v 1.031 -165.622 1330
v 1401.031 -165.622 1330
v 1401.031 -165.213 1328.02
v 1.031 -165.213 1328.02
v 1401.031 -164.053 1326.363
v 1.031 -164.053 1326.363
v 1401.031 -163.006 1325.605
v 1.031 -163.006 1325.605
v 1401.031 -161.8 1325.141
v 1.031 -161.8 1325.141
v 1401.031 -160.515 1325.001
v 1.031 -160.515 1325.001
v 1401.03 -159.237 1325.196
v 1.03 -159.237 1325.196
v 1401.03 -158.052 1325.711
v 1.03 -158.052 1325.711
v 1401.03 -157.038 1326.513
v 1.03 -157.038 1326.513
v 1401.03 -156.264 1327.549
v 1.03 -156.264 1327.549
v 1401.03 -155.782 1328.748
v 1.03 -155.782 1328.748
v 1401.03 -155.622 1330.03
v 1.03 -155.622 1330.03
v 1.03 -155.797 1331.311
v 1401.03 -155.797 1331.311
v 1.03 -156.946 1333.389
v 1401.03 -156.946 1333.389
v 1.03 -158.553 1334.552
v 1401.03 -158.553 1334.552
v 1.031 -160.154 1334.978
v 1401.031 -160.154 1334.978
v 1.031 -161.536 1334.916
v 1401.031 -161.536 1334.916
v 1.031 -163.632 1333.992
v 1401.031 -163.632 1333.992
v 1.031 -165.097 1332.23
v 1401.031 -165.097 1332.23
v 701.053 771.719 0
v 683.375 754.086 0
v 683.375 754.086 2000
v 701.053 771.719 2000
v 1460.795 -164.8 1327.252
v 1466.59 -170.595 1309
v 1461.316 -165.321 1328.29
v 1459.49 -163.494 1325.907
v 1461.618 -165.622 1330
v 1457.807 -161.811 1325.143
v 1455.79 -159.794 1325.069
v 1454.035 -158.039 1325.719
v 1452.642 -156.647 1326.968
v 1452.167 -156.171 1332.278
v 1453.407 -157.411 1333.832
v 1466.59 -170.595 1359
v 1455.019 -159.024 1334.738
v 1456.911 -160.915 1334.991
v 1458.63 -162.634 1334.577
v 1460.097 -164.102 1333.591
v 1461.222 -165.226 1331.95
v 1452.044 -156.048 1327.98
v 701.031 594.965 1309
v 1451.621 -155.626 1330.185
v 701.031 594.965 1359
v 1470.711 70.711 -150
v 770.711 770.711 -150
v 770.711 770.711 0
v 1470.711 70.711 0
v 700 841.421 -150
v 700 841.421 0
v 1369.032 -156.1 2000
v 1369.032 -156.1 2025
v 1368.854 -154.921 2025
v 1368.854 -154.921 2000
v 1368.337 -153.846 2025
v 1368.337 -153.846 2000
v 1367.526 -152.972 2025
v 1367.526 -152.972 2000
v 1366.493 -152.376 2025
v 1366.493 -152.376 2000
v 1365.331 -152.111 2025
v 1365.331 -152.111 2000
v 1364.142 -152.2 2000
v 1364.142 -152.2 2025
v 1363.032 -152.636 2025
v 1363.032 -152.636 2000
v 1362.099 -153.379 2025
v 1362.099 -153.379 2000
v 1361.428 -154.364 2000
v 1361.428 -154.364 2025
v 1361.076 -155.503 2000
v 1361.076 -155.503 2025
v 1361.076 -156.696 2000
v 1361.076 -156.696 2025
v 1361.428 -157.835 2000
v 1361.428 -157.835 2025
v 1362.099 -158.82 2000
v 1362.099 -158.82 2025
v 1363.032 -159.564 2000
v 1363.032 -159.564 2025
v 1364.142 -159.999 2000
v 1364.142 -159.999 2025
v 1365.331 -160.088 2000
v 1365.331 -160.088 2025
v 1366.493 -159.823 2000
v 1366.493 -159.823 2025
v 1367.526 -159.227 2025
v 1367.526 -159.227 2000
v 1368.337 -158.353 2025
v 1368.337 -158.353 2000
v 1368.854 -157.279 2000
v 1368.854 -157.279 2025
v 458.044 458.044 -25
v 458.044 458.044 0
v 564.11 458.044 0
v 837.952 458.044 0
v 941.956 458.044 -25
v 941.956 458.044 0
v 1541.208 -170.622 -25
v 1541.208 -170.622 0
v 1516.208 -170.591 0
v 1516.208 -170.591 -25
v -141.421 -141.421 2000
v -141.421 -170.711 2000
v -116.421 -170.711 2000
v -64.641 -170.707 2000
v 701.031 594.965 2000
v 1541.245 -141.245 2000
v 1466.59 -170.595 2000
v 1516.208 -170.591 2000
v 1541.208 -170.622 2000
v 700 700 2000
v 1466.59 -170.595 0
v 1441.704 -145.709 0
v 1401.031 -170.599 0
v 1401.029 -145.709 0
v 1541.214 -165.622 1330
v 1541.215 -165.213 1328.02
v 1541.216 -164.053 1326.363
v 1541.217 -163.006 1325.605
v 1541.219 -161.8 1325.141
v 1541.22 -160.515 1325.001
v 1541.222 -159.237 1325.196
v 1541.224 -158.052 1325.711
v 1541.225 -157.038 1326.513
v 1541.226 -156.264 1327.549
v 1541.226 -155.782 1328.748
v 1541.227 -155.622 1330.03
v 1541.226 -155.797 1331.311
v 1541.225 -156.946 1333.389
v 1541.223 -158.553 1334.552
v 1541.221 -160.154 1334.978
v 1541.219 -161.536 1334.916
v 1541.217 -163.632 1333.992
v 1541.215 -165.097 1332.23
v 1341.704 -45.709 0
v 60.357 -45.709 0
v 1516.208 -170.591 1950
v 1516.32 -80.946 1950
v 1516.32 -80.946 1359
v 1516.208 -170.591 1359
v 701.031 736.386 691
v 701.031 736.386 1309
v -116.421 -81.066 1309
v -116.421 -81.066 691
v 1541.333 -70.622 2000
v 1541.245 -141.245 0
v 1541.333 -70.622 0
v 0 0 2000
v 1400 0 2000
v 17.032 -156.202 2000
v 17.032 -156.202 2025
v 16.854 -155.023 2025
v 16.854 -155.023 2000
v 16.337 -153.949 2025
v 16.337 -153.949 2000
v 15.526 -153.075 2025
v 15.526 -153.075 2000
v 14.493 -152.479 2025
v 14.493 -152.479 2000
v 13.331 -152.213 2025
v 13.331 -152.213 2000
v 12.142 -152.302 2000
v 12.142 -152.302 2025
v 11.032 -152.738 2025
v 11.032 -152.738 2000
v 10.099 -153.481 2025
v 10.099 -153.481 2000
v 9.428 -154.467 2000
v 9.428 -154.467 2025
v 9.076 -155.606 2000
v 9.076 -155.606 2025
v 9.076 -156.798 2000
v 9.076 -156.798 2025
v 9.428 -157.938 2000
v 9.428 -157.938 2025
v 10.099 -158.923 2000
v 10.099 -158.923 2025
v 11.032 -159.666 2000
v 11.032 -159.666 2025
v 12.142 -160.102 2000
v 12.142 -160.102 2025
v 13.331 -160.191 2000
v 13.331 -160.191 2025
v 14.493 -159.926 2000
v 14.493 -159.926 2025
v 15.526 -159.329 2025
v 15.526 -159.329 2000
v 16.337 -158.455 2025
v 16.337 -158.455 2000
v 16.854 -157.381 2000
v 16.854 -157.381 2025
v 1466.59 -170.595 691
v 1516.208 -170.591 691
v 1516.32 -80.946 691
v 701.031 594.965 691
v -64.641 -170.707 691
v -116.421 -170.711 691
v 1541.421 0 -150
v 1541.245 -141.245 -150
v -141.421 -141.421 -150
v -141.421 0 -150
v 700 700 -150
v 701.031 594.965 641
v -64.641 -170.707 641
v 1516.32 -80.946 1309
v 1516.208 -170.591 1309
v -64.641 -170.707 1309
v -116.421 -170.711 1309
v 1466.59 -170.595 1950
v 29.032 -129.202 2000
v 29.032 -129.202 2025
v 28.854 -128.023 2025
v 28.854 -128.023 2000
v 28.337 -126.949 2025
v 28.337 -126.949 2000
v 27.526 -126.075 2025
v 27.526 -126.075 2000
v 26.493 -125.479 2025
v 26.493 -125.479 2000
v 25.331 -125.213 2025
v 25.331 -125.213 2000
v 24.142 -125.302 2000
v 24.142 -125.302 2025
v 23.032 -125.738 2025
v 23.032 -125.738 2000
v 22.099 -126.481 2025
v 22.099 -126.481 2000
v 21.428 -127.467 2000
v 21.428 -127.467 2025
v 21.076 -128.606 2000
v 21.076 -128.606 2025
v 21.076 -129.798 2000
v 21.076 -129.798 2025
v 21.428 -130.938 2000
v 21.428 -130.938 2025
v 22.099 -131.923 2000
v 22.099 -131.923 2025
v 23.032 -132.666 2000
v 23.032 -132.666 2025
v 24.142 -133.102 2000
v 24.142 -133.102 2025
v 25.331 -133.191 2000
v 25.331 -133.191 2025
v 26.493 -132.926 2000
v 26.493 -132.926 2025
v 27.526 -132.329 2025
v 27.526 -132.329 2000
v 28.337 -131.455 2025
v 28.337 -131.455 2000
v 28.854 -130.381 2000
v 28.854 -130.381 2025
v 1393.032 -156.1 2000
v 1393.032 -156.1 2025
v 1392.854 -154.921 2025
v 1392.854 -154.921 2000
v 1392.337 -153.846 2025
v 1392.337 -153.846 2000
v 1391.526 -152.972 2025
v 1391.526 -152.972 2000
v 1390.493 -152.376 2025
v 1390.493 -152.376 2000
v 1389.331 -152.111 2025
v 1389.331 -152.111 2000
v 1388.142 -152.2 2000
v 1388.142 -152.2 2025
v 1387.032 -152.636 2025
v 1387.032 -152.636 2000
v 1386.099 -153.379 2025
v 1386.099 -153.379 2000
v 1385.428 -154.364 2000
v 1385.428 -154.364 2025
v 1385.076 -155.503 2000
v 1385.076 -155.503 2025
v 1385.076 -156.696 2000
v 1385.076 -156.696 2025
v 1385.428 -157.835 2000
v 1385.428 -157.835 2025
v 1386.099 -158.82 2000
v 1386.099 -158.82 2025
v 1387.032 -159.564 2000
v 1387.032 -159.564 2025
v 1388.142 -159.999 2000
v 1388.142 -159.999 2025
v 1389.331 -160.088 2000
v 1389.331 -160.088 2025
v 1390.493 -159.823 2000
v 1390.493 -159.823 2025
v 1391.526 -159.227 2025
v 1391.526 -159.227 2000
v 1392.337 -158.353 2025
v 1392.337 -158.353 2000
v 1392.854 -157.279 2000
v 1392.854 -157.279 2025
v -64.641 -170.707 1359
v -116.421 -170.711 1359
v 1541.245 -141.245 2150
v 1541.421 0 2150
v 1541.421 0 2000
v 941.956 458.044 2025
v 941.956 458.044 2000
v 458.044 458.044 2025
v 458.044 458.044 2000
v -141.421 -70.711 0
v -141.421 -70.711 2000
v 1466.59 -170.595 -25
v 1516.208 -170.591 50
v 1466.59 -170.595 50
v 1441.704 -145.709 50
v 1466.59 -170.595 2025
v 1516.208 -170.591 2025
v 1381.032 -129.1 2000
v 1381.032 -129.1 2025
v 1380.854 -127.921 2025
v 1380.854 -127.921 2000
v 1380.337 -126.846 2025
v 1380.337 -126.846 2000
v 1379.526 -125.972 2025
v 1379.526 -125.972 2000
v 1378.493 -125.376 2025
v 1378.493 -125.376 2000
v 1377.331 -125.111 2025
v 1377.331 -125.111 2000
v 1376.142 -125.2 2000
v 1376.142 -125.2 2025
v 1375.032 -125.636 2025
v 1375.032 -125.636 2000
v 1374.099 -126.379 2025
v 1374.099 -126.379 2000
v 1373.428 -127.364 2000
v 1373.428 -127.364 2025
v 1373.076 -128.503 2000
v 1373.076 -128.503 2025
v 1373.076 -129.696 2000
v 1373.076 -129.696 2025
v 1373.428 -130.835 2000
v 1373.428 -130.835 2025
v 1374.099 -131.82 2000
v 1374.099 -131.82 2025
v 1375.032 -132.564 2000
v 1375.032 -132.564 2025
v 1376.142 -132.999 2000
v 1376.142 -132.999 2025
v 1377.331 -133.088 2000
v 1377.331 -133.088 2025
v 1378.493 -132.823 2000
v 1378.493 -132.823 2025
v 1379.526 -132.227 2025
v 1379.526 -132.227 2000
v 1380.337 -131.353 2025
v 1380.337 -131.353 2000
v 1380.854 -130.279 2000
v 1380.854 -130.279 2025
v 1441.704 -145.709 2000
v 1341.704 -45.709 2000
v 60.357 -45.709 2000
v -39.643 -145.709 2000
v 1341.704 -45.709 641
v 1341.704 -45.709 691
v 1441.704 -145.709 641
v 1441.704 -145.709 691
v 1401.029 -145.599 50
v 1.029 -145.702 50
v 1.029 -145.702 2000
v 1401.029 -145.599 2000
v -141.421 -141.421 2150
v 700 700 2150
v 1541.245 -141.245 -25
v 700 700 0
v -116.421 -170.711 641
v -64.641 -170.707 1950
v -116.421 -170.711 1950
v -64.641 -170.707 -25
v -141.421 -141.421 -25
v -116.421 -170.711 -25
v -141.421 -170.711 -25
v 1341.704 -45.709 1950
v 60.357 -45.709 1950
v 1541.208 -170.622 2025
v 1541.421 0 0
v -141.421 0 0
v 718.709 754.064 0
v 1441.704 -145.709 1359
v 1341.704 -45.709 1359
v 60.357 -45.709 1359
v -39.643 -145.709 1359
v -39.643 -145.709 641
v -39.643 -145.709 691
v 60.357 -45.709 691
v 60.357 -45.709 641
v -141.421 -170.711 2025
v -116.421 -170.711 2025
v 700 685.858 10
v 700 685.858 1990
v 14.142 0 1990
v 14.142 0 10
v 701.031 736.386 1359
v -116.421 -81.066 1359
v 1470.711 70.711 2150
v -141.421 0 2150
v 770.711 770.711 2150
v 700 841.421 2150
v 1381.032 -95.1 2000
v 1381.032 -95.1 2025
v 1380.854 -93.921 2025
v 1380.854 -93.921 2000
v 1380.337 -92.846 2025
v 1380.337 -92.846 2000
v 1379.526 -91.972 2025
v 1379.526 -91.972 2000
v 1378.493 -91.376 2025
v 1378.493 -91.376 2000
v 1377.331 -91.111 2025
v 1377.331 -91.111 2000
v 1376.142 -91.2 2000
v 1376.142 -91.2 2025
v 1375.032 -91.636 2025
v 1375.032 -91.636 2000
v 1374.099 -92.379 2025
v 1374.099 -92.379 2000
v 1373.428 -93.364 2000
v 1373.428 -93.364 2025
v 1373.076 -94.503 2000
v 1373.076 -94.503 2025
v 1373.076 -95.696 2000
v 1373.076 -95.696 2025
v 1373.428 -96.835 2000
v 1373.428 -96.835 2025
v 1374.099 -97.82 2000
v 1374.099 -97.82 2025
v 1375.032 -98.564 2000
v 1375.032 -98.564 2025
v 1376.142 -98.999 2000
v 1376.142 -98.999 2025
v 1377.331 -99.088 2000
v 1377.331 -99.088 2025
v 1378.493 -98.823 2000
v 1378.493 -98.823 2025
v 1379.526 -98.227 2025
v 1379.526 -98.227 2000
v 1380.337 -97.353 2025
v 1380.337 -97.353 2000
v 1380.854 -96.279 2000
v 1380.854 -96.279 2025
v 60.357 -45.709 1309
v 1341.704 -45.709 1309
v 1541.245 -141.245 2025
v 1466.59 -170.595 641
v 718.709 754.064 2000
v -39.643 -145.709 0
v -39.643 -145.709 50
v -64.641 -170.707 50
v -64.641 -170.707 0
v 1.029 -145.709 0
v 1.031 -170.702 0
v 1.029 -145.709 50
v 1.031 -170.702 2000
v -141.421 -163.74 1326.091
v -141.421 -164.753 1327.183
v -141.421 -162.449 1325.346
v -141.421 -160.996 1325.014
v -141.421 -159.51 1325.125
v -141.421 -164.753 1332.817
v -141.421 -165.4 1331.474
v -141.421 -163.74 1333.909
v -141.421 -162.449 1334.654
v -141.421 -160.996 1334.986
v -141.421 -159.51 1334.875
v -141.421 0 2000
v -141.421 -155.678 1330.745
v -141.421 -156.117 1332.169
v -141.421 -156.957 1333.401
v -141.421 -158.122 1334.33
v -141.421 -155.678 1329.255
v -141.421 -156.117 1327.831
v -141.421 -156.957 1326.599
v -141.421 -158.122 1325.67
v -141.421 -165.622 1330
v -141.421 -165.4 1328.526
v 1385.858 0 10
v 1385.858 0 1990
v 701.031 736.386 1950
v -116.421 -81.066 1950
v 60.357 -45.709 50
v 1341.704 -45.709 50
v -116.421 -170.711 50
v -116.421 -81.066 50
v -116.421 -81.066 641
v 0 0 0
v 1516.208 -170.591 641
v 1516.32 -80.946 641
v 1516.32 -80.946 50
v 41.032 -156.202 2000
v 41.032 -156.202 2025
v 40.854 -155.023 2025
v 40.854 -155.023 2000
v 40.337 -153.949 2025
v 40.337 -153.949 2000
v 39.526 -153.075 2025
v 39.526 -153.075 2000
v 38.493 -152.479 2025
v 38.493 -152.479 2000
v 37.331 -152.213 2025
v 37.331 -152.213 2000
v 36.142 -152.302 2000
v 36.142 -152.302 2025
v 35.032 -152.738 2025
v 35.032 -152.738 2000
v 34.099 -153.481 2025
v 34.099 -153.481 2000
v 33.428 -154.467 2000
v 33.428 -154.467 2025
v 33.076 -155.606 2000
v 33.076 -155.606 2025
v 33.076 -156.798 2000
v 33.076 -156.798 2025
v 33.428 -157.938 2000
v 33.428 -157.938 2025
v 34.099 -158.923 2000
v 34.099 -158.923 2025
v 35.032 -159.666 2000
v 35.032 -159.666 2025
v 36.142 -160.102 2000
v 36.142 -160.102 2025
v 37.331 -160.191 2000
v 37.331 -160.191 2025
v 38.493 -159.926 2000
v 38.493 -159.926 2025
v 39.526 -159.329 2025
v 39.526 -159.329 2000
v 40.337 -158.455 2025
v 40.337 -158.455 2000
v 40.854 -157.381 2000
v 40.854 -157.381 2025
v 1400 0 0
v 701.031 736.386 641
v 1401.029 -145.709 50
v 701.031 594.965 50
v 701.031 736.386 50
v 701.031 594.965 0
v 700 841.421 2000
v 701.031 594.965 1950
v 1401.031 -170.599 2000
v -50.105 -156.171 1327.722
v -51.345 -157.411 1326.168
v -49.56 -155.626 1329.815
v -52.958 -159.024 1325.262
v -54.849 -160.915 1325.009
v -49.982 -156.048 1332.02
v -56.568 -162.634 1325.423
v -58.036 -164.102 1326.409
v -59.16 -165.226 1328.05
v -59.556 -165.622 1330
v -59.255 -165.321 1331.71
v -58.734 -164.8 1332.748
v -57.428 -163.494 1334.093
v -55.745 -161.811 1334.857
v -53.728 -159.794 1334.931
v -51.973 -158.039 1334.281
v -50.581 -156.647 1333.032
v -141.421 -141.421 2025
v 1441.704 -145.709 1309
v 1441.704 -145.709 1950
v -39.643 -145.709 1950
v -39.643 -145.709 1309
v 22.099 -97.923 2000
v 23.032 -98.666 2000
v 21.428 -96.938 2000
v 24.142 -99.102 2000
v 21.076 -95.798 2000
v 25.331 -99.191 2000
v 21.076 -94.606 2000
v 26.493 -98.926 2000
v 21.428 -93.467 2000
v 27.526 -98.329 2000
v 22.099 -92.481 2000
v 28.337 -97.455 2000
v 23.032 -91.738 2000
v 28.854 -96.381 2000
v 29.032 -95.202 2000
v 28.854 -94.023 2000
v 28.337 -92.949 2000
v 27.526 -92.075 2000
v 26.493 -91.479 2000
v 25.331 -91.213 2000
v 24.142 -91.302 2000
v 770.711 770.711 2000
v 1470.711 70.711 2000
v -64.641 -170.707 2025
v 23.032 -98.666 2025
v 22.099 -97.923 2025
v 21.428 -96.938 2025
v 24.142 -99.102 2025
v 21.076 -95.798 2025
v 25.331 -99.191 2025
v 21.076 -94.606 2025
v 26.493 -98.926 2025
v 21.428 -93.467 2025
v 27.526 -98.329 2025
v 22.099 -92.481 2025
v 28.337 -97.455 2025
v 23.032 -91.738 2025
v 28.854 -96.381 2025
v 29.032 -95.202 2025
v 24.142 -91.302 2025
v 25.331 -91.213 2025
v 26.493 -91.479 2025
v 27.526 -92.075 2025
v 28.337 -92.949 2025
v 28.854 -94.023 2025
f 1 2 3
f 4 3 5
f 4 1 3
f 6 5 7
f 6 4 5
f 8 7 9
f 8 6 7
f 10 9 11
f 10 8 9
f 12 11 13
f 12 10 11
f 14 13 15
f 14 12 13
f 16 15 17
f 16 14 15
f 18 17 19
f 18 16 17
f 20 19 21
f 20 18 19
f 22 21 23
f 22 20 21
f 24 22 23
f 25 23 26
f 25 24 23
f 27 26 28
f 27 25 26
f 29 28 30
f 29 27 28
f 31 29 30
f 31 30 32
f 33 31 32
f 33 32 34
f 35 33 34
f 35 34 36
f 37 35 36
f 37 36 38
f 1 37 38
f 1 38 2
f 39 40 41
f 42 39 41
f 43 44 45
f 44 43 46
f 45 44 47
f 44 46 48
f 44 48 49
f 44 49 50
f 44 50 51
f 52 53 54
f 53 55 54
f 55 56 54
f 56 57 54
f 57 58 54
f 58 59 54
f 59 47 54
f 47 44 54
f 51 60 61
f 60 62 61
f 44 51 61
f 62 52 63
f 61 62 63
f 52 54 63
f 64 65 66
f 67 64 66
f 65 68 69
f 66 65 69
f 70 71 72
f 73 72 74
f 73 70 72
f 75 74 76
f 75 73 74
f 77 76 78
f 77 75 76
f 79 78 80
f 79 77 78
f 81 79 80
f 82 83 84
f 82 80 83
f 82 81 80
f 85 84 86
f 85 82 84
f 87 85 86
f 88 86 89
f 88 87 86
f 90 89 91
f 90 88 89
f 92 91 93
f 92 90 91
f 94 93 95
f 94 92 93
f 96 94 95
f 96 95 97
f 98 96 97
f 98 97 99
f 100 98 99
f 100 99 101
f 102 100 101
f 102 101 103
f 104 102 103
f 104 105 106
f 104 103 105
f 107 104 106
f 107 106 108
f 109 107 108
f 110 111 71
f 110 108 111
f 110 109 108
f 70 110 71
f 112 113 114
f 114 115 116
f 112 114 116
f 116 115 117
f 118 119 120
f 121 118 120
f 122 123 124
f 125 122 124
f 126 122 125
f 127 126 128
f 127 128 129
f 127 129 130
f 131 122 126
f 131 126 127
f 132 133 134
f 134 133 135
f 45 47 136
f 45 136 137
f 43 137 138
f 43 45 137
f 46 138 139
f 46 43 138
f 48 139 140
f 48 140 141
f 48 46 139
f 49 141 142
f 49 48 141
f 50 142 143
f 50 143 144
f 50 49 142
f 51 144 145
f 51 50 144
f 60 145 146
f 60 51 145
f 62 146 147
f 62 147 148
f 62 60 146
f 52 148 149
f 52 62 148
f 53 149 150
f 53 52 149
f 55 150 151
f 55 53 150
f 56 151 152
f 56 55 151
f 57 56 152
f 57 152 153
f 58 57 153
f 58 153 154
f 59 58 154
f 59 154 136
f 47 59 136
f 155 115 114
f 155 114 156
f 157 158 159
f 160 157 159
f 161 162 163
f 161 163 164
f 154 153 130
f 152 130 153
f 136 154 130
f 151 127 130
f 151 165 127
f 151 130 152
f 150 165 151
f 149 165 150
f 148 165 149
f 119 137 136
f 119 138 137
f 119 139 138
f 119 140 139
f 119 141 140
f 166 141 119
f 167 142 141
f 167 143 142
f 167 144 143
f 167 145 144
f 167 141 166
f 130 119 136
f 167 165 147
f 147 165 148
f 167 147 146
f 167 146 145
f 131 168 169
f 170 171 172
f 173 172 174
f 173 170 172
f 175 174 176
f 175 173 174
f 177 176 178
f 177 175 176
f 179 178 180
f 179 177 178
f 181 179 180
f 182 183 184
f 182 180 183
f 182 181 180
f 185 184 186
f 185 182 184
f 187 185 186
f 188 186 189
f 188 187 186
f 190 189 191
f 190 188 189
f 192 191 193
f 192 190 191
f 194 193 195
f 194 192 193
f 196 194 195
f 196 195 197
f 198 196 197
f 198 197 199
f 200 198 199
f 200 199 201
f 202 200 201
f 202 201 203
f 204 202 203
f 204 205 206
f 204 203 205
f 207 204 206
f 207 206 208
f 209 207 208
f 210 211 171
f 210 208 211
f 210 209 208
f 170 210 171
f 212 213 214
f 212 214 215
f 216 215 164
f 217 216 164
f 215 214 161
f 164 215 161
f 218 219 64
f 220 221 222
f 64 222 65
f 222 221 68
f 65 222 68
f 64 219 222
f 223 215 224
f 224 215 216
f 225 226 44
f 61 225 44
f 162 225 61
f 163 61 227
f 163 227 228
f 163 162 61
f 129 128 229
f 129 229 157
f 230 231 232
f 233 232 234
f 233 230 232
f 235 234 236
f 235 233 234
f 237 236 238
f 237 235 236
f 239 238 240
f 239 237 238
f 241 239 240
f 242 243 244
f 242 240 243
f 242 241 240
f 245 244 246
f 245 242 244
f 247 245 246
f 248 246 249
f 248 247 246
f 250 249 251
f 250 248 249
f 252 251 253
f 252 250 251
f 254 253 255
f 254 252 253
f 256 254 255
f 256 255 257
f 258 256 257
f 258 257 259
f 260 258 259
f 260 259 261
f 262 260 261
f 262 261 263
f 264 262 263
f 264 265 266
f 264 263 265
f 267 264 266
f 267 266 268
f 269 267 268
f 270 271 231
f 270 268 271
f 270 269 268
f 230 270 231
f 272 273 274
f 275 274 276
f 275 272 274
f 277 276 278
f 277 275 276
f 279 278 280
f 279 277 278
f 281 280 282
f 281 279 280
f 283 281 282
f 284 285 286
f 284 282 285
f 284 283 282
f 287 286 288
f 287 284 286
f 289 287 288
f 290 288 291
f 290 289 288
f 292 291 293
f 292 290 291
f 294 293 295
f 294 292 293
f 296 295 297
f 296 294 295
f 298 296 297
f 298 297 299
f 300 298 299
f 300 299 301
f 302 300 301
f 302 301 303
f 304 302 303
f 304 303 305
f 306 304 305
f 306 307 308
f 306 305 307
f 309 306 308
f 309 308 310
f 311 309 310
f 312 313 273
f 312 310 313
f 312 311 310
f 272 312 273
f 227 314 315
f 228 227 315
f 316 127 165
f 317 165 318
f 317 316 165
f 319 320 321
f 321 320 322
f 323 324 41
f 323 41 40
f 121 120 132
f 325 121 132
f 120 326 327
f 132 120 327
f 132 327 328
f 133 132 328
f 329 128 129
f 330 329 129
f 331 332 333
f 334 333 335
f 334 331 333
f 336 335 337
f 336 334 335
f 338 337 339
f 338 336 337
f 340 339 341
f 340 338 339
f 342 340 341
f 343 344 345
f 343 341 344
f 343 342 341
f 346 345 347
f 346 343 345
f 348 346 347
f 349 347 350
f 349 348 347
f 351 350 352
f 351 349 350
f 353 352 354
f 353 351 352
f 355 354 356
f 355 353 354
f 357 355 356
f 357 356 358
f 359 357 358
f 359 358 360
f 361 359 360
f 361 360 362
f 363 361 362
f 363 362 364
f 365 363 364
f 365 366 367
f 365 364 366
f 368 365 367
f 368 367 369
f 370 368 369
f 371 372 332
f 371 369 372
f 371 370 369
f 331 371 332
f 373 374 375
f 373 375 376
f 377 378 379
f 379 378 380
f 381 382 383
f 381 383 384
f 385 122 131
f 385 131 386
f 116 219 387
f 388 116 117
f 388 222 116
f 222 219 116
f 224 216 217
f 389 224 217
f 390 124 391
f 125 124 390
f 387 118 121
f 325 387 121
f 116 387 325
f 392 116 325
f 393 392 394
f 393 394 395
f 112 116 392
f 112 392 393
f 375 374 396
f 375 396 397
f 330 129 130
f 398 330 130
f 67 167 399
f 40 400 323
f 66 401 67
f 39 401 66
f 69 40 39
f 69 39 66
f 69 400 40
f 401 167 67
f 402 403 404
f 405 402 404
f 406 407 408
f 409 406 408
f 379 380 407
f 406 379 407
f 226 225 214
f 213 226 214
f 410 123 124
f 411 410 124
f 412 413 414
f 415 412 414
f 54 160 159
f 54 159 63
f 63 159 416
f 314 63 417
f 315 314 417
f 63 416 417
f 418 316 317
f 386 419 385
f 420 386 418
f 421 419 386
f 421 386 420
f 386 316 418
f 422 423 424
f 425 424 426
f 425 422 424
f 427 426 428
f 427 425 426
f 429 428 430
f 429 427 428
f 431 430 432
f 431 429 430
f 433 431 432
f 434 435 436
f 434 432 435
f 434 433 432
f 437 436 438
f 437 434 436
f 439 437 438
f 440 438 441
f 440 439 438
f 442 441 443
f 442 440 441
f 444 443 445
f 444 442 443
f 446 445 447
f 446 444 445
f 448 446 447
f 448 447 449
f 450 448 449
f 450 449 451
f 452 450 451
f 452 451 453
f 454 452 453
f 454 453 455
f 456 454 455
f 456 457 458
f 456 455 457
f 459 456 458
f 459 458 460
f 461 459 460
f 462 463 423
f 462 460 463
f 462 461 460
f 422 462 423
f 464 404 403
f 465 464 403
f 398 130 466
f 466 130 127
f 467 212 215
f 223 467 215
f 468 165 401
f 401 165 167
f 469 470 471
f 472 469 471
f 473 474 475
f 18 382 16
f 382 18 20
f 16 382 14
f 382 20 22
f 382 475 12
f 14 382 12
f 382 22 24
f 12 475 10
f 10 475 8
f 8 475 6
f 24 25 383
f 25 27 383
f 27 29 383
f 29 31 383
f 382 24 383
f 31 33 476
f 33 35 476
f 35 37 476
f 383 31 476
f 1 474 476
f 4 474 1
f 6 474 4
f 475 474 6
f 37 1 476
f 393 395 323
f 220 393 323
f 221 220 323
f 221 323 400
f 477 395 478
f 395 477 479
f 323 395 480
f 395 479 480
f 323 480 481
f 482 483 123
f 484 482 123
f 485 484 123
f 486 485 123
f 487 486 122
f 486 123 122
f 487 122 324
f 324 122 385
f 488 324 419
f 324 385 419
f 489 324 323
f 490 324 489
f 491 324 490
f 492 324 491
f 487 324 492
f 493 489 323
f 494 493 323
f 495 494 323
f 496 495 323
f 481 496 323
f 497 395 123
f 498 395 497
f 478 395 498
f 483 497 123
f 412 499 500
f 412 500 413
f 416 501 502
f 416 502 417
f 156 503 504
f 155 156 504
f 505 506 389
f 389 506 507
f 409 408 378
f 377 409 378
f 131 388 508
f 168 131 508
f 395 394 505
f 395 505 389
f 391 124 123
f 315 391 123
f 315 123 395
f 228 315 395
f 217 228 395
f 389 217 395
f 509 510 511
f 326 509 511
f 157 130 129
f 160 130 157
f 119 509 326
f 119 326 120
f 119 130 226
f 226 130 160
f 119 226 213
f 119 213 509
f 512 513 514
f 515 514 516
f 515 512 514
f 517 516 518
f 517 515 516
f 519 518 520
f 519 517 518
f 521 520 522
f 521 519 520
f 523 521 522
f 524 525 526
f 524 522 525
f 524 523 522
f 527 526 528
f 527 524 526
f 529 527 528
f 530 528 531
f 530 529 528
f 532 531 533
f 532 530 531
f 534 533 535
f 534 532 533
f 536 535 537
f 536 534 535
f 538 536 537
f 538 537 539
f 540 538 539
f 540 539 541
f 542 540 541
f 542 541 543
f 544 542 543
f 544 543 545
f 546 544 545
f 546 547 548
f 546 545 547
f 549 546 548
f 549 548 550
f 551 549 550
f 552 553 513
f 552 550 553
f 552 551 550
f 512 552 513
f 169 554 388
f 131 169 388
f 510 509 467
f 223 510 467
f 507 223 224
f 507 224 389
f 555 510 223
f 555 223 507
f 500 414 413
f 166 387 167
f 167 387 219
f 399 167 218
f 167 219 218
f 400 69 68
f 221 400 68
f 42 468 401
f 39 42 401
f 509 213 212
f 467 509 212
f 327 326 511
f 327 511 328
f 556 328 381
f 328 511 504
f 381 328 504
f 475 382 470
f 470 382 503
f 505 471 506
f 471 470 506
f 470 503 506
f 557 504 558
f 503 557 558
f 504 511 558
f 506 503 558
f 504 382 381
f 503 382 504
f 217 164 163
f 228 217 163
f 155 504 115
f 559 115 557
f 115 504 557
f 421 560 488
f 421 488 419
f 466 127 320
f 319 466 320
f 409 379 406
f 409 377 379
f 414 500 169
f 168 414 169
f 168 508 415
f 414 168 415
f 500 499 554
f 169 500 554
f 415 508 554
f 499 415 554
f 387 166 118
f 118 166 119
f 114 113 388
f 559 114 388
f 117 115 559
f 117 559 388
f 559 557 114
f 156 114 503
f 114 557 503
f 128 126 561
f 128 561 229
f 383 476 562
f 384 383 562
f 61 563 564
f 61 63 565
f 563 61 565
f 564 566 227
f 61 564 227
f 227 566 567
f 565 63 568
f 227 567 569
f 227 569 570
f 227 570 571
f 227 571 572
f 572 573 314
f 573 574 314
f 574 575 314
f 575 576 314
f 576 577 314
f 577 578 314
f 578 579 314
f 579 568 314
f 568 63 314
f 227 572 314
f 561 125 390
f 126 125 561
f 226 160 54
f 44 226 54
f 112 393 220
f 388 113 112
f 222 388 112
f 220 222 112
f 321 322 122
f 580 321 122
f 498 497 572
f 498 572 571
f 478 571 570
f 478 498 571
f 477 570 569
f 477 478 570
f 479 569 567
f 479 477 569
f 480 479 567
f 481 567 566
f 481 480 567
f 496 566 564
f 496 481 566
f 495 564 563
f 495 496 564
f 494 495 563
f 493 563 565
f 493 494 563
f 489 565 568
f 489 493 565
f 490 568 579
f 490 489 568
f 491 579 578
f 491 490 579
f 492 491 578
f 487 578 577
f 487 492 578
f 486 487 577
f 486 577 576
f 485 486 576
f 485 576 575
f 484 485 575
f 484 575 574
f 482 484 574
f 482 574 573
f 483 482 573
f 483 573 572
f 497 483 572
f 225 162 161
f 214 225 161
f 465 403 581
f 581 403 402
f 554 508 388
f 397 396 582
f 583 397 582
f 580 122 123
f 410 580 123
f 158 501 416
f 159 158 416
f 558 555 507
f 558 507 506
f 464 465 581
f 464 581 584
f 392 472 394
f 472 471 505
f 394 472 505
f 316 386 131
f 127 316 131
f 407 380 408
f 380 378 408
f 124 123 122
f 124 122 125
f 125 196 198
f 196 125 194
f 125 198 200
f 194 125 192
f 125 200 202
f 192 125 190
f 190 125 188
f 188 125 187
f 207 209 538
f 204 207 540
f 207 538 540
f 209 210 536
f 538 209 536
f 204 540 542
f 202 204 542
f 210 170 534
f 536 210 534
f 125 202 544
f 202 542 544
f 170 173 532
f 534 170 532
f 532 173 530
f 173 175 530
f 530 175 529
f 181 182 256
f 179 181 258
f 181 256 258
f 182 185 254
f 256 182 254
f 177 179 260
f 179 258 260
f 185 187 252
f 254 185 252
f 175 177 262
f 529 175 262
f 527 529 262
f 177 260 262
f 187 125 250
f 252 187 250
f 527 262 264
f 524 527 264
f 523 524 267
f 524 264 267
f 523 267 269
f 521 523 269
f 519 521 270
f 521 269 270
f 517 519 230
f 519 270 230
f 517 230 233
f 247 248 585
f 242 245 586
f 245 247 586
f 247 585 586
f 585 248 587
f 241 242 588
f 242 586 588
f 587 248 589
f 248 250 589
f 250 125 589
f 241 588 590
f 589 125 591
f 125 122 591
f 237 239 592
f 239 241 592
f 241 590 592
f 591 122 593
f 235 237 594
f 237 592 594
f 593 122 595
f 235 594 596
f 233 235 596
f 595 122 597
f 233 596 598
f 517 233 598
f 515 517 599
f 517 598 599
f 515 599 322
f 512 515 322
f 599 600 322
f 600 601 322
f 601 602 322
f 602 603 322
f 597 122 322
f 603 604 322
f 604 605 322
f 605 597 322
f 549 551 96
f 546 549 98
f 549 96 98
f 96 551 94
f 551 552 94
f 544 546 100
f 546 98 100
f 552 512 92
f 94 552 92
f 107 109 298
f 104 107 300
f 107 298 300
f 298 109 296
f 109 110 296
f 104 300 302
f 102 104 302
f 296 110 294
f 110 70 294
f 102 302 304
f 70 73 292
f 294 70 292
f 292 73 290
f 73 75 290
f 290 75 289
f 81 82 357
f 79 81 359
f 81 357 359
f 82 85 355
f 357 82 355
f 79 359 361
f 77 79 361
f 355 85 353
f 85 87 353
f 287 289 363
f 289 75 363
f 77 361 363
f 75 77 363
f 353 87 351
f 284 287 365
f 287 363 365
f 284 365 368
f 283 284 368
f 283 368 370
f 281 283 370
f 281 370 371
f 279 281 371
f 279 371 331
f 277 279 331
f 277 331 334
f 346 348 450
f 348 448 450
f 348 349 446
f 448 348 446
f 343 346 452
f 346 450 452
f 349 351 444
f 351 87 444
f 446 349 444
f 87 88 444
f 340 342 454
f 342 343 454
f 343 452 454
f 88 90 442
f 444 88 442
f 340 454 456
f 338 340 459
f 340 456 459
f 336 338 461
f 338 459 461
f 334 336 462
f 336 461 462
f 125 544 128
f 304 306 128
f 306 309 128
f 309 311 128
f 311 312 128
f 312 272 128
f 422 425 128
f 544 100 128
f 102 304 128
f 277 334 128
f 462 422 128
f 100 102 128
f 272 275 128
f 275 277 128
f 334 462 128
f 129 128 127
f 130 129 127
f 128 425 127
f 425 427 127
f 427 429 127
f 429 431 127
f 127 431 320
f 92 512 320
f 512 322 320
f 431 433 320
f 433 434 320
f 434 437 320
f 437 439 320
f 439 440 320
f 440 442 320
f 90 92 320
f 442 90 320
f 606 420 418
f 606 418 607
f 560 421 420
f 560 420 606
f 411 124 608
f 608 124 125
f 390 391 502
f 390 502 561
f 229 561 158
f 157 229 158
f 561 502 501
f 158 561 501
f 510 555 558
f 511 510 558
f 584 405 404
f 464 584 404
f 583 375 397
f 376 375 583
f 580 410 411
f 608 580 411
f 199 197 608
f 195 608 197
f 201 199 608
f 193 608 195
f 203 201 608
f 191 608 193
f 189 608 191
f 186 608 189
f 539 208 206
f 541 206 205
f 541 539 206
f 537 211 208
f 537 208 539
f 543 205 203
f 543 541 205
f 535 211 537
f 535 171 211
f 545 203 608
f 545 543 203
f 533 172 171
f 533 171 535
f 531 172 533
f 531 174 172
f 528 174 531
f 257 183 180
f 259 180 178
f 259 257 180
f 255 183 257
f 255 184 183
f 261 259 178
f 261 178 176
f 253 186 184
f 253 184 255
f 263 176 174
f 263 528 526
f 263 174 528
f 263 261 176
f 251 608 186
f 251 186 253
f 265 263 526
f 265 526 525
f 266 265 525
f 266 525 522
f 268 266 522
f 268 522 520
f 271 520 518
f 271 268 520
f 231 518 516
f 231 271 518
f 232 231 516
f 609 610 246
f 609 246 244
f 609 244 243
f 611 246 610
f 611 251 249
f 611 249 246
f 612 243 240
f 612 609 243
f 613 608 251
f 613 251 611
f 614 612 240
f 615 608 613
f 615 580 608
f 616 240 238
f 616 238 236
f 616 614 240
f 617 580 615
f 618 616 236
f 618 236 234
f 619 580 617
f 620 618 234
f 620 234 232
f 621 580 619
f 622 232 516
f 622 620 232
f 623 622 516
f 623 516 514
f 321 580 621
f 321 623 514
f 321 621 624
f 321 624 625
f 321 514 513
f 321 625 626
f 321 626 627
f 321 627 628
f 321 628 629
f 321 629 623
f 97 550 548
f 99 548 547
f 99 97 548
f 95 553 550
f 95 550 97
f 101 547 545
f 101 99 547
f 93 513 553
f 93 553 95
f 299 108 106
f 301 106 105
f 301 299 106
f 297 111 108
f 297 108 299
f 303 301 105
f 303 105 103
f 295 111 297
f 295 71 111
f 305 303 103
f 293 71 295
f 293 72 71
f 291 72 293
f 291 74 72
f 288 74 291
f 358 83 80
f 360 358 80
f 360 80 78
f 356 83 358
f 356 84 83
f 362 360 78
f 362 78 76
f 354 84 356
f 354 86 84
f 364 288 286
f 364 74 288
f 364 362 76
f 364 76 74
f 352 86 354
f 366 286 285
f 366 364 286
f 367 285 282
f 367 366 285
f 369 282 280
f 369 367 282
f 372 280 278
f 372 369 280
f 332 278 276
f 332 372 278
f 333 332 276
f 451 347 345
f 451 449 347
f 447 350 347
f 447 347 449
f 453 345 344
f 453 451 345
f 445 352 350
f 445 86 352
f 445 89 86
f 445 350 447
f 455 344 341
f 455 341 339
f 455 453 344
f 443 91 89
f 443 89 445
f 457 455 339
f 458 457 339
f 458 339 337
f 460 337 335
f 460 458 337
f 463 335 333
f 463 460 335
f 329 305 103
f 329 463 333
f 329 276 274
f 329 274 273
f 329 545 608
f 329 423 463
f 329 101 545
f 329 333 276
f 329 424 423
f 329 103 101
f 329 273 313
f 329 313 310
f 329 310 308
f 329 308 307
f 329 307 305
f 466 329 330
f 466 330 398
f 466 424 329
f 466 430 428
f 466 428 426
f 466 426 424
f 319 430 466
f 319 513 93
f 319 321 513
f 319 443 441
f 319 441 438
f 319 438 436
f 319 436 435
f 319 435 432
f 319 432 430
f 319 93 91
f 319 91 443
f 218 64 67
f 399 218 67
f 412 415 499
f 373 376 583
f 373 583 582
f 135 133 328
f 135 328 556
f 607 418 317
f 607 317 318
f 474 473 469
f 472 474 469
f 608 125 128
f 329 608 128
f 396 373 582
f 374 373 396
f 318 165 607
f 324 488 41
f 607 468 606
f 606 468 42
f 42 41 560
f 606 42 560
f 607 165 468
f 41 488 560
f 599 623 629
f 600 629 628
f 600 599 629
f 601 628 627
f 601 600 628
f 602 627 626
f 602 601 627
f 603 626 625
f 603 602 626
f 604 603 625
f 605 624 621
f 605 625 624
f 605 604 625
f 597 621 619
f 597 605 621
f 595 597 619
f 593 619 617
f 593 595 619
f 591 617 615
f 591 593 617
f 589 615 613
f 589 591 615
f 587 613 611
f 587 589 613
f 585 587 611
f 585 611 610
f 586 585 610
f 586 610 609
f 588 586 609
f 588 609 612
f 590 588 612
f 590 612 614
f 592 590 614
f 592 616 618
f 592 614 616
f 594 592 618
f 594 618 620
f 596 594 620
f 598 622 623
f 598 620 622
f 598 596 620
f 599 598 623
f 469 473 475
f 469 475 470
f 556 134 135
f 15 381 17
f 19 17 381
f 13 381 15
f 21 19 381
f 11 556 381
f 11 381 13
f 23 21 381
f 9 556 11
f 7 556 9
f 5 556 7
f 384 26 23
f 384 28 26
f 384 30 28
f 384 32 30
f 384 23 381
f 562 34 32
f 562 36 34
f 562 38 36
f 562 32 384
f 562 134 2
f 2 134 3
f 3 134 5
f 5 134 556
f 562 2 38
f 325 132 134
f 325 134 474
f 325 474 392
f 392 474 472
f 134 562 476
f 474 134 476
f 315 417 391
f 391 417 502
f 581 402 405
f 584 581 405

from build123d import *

# Parameters (mm, degrees)
BOSS_EXTRUDE1_DEPTH      = 2000
SHELL1_T                 = -10
SKETCH3_W                = 150
SKETCH3_H                = 1096.015510839
BOSS_EXTRUDE2_DEPTH      = 100
SKETCH7_W                = 150
SKETCH7_H                = 1089.949493661
BOSS_EXTRUDE4_DEPTH      = 100
CUT_EXTRUDE1_DEPTH       = 6
CUT_EXTRUDE1_DEPTH_BACK  = 6.066017
SKETCH8_W                = 150
SKETCH8_H                = 100
SKETCH9_W                = 150
SKETCH9_H                = 100
BOSS_EXTRUDE5_DEPTH      = 239.05
SKETCH10_W               = 150
SKETCH10_H               = 100
BOSS_EXTRUDE6_DEPTH      = 399.5
CUT_EXTRUDE4_DEPTH       = 1197.5
SKETCH14_W               = 2000
SKETCH14_H               = 100
BOSS_EXTRUDE7_DEPTH      = 25
SKETCH15_W               = 2000
SKETCH15_H               = 100
BOSS_EXTRUDE8_DEPTH      = 25
SKETCH16_W               = 2000
SKETCH16_H               = 25
BOSS_EXTRUDE9_DEPTH      = 1436
SKETCH17_W               = 25
SKETCH17_H               = 2000
BOSS_EXTRUDE10_DEPTH     = 1436
CUT_EXTRUDE11_DEPTH      = 1286
CUT_EXTRUDE12_DEPTH      = 1286
BOSS_EXTRUDE13_DEPTH     = 50
BOSS_EXTRUDE14_DEPTH     = 50
BOSS_EXTRUDE15_DEPTH     = 50
BOSS_EXTRUDE16_DEPTH     = 50
BOSS_EXTRUDE17_DEPTH     = 50
BOSS_EXTRUDE18_DEPTH     = 50
BOSS_EXTRUDE19_DEPTH     = 50
BOSS_EXTRUDE20_DEPTH     = 50
SKETCH34_W               = 1400
SKETCH34_H               = 2000
BOSS_EXTRUDE21_DEPTH     = 25
BOSS_EXTRUDE22_DEPTH     = 25
BOSS_EXTRUDE23_DEPTH     = 25
CUT_EXTRUDE16_DEPTH      = 2777.052898712
CUT_EXTRUDE16_DEPTH_BACK = 2777.052898712
SKETCH43_R               = 5
SKETCH45_R               = 4
CUT_EXTRUDE17_DEPTH      = 30


with BuildPart() as part:
    # Sketch1 → Boss-Extrude1 (new body)
    with BuildSketch(Plane.XY):
        Polygon((0, 0), (1400, 0), (700, 700), align=None)
    extrude(amount=BOSS_EXTRUDE1_DEPTH)

    # Shell1
    shell1_openings = [part.faces().sort_by_distance(p)[0] for p in [
        (700, 0, 1000),
    ]]
    offset(amount=SHELL1_T, openings=shell1_openings, kind=Kind.INTERSECTION)


with BuildPart() as body_2:
    # Sketch3 → Boss-Extrude2 (new body)
    with BuildSketch(Plane(origin=(0, 0, 0), x_dir=(0, 0, 1), z_dir=(-0.7071067811865477, 0.7071067811865475, 0))):
        with Locations((2075, 548.00775542)):
            Rectangle(SKETCH3_W, SKETCH3_H)
    extrude(amount=BOSS_EXTRUDE2_DEPTH)

    # Sketch7 → Boss-Extrude4 (add)
    with BuildSketch(Plane(origin=(700, 700, 0), x_dir=(0, 0, -1), z_dir=(0.7071067811865477, 0.7071067811865475, 0))):
        with Locations((-2075, -444.974746831)):
            Rectangle(SKETCH7_W, SKETCH7_H)
    extrude(amount=BOSS_EXTRUDE4_DEPTH)

    # Sketch8 → Cut-Extrude1 (cut, two sides: drawn at the far end of the back side and taken through both)
    with BuildSketch(Plane(origin=(775, 775, 0), x_dir=(0, 0, -1), z_dir=(0.7071067811865476, 0.7071067811865476, 0)).offset(-CUT_EXTRUDE1_DEPTH_BACK)):
        with Locations((-2075, 50)):
            Rectangle(SKETCH8_W, SKETCH8_H)
    extrude(amount=CUT_EXTRUDE1_DEPTH + CUT_EXTRUDE1_DEPTH_BACK, mode=Mode.SUBTRACT)

    # Sketch9 → Boss-Extrude5 (add)
    with BuildSketch(Plane(origin=(0, 0, 0), x_dir=(0, 0, 1), z_dir=(-0.7071067811865476, -0.7071067811865476, 0))):
        with Locations((2075, 50)):
            Rectangle(SKETCH9_W, SKETCH9_H)
    extrude(amount=BOSS_EXTRUDE5_DEPTH)

    # Sketch10 → Boss-Extrude6 (add)
    with BuildSketch(Plane(origin=(700, -700, 0), x_dir=(0, 0, -1), z_dir=(0.7071067811865476, -0.7071067811865476, 0))):
        with Locations((-2075, 1039.949493661)):
            Rectangle(SKETCH10_W, SKETCH10_H)
    extrude(amount=BOSS_EXTRUDE6_DEPTH)

    # Sketch13 → Cut-Extrude4 (cut)
    with BuildSketch(Plane.XY.offset(2150)):
        Polygon((-141.421356237, 0), (-141.421356237, -141.421356237), (-169.033876043, -169.033876043), (-239.744554161, -98.323197924), align=None)
        Polygon((1541.421356237, 0), (1753.199837203, -211.778480965), (1682.489159084, -282.489159084), (1541.244579542, -141.244579542), align=None)
    extrude(amount=-CUT_EXTRUDE4_DEPTH, mode=Mode.SUBTRACT)


with BuildPart() as body_3:
    # Mirror4: mirrored copy
    add(body_2.part.mirror(Plane.XY.offset(1000)))


with BuildPart() as body_2_1:
    add(body_2.part)

    add(body_3.part)  # Boss-Extrude7 merges body 3
    # Sketch14 → Boss-Extrude7 (add)
    with BuildSketch(Plane.ZY.offset(141.421356237)):
        with Locations((1000, -120.710678119)):
            Rectangle(SKETCH14_W, SKETCH14_H)
    extrude(amount=-BOSS_EXTRUDE7_DEPTH)

    # Sketch15 → Boss-Extrude8 (add)
    with BuildSketch(Plane(origin=(1541.418941738, -1.929185159, 0), x_dir=(0, 0, -1), z_dir=(0.999999216794127, -0.001251563475337267, 0))):
        with Locations((-1000, -118.693158413)):
            Rectangle(SKETCH15_W, SKETCH15_H)
    extrude(amount=-BOSS_EXTRUDE8_DEPTH)

    # Sketch16 → Boss-Extrude9 (add)
    with BuildSketch(Plane(origin=(-106.066017178, -106.066017178, 0), x_dir=(0, 0, -1), z_dir=(0.7071067811865483, 0.7071067811865468, 0))):
        with Locations((-1000, 37.5)):
            Rectangle(SKETCH16_W, SKETCH16_H)
    extrude(amount=BOSS_EXTRUDE9_DEPTH)

    # Sketch17 → Boss-Extrude10 (add)
    with BuildSketch(Plane(origin=(804.048443672, -806.063602678, 0), x_dir=(0.7079912163968599, 0.7062212383558673, 0), z_dir=(-0.7062212383558673, 0.7079912163968599, 0))):
        with Locations((1028.875241871, -1000)):
            Rectangle(SKETCH17_W, SKETCH17_H)
    extrude(amount=BOSS_EXTRUDE10_DEPTH)

    # Sketch27 → Cut-Extrude11 (cut)
    with BuildSketch(Plane(origin=(719.584743808, 717.785781949, 0), x_dir=(0, 0, 1), z_dir=(-0.7079912163968599, -0.7062212383558673, 0))):
        Polygon((0, 101.272137447), (0, 51.272098287), (2000, 51.272098287), (2000, 101.272137447), (2000, 297.477961859), (0, 297.477961859), align=None)
    extrude(amount=-CUT_EXTRUDE11_DEPTH, mode=Mode.SUBTRACT)

    # Sketch28 → Cut-Extrude12 (cut)
    with BuildSketch(Plane(origin=(-17.67766953, 17.67766953, 0), x_dir=(0, 0, -1), z_dir=(0.7071067811865468, -0.7071067811865483, 0))):
        Polygon((-2000, 1041.407346594), (0, 1041.407346594), (0, 1089.949493661), (0, 1286), (-2000, 1286), (-2000, 1089.949493661), align=None)
    extrude(amount=-CUT_EXTRUDE12_DEPTH, mode=Mode.SUBTRACT)

    # Sketch29 → Boss-Extrude13 (add)
    with BuildSketch(Plane(origin=(0, 0, 2000), x_dir=(-1, 0, 0), z_dir=(0, 0, -1))):
        Polygon((-701.03084385, 594.964826672), (-1466.590232409, -170.594561887), (-1516.207831122, -170.590922364), (-1516.320027106, -80.946331633), (-701.03084385, 736.386182909), (-630.320165731, 665.67550479), (116.421356237, -81.066017178), (116.421356237, -170.710678119), (64.640862765, -170.706879943), align=None)
    extrude(amount=BOSS_EXTRUDE13_DEPTH)

    # Sketch30 → Boss-Extrude14 (add)
    with BuildSketch(Plane(origin=(0, 0, 1359), x_dir=(-1, 0, 0), z_dir=(0, 0, -1))):
        Polygon((-701.03084385, 736.386182909), (-1516.320027106, -80.946331633), (-1516.207831122, -170.590922364), (-1466.590232409, -170.594561887), (-701.03084385, 594.964826672), (64.640862765, -170.706879943), (116.421356237, -170.710678119), (116.421356237, -81.066017178), align=None)
    extrude(amount=BOSS_EXTRUDE14_DEPTH)

    # Sketch31 → Boss-Extrude15 (add)
    with BuildSketch(Plane(origin=(0, 0, 691), x_dir=(-1, 0, 0), z_dir=(0, 0, -1))):
        Polygon((116.421356237, -81.066017178), (-701.03084385, 736.386182909), (-1516.320027106, -80.946331633), (-1516.207831122, -170.590922364), (-1466.590232409, -170.594561887), (-701.03084385, 594.964826672), (64.640862765, -170.706879943), (116.421356237, -170.710678119), align=None)
    extrude(amount=BOSS_EXTRUDE15_DEPTH)

    # Sketch33 → Boss-Extrude16 (add)
    with BuildSketch(Plane(origin=(0, 0, 50), x_dir=(-1, 0, 0), z_dir=(0, 0, -1))):
        Polygon((116.421356237, -170.710678119), (116.421356237, -81.066017178), (-701.03084385, 736.386182909), (-1516.320027106, -80.946331633), (-1516.207831122, -170.590922364), (-1466.590232409, -170.594561887), (-701.03084385, 594.964826672), (64.640862765, -170.706879943), align=None)
    extrude(amount=BOSS_EXTRUDE16_DEPTH)



with BuildPart() as body_3_2:
    # Sketch35 → Boss-Extrude17 (new body)
    with BuildSketch(Plane.XY.offset(2000)):
        Polygon((1341.704449553, -45.708779031), (60.357238147, -45.708779031), (-39.642761853, -145.708779031), (1441.704449553, -145.708779031), align=None)
    extrude(amount=-BOSS_EXTRUDE17_DEPTH)


with BuildPart() as body_4:
    # Sketch36 → Boss-Extrude18 (new body)
    with BuildSketch(Plane(origin=(0, 0, 1359), x_dir=(-1, 0, 0), z_dir=(0, 0, -1))):
        Polygon((39.642761853, -145.708779031), (-60.357238147, -45.708779031), (-1341.704449553, -45.708779031), (-1441.704449553, -145.708779031), align=None)
    extrude(amount=BOSS_EXTRUDE18_DEPTH)


with BuildPart() as body_5:
    # Sketch37 → Boss-Extrude19 (new body)
    with BuildSketch(Plane(origin=(0, 0, 691), x_dir=(-1, 0, 0), z_dir=(0, 0, -1))):
        Polygon((-1441.704449553, -145.708779031), (39.642761853, -145.708779031), (-60.357238147, -45.708779031), (-1341.704449553, -45.708779031), align=None)
    extrude(amount=BOSS_EXTRUDE19_DEPTH)


with BuildPart() as body_6:
    # Sketch38 → Boss-Extrude20 (new body)
    with BuildSketch(Plane(origin=(0, 0, 50), x_dir=(-1, 0, 0), z_dir=(0, 0, -1))):
        Polygon((-1341.704449553, -45.708779031), (-1441.704449553, -145.708779031), (39.642761853, -145.708779031), (-60.357238147, -45.708779031), align=None)
    extrude(amount=BOSS_EXTRUDE20_DEPTH)


with BuildPart() as body_7:
    # Sketch34 → Boss-Extrude21 (new body)
    with BuildSketch(Plane(origin=(0.012521253, -170.702137522, 0), x_dir=(0.9999999973097808, 7.335147241276342e-05, 0), z_dir=(7.335147241276342e-05, -0.9999999973097808, 0))):
        with Locations((701.018757721, 1000)):
            Rectangle(SKETCH34_W, SKETCH34_H)
    extrude(amount=-BOSS_EXTRUDE21_DEPTH)


with BuildPart() as body_8:
    # Sketch39 → Boss-Extrude22 (new body)
    with BuildSketch(Plane.XY.offset(2000)):
        Polygon((-64.640862765, -170.706879943), (1466.590232409, -170.594561887), (1516.207831122, -170.590922364), (1541.207811542, -170.62221145), (1541.244579542, -141.244579542), (941.956165613, 458.043834387), (458.043834387, 458.043834387), (-141.421356237, -141.421356237), (-141.421356237, -170.710678119), (-116.421356237, -170.710678119), align=None)
    extrude(amount=BOSS_EXTRUDE22_DEPTH)

    # Sketch45 → Cut-Extrude17 (cut)
    with BuildSketch(Plane.XY.offset(2000)):
        with Locations((13.031645739, -156.202062795)):
            Circle(SKETCH45_R)
        with Locations((37.031645739, -156.202062795)):
            Circle(SKETCH45_R)
        with Locations((25.031645739, -129.202062795)):
            Circle(SKETCH45_R)
        with Locations((25.031645739, -95.202062795)):
            Circle(SKETCH45_R)
        with Locations((1365.031641973, -156.099664126)):
            Circle(SKETCH45_R)
        with Locations((1389.031641973, -156.099664126)):
            Circle(SKETCH45_R)
        with Locations((1377.031641973, -129.099664126)):
            Circle(SKETCH45_R)
        with Locations((1377.031641973, -95.099664126)):
            Circle(SKETCH45_R)
    extrude(amount=CUT_EXTRUDE17_DEPTH, mode=Mode.SUBTRACT)


with BuildPart() as body_2_2:
    add(body_2_1.part)

    add(body_6.part)  # Boss-Extrude23 merges body 6

    add(body_7.part)  # Boss-Extrude23 merges body 7
    # Sketch40 → Boss-Extrude23 (add)
    with BuildSketch(Plane(origin=(0, 0, 0), x_dir=(-1, 0, 0), z_dir=(0, 0, -1))):
        Polygon((-1466.590232409, -170.594561887), (64.640862765, -170.706879943), (116.421356237, -170.710678119), (141.421356237, -170.710678119), (141.421356237, -141.421356237), (-458.043834387, 458.043834387), (-941.956165613, 458.043834387), (-1541.244579542, -141.244579542), (-1541.207811542, -170.62221145), (-1516.207831122, -170.590922364), align=None)
    extrude(amount=BOSS_EXTRUDE23_DEPTH)

    # Sketch43 → Cut-Extrude16 (cut, two sides: drawn at the far end of the back side and taken through both)
    with BuildSketch(Plane(origin=(0, 0, 0), x_dir=(0, 0, -1), z_dir=(1, 0, 0)).offset(-CUT_EXTRUDE16_DEPTH_BACK)):
        with Locations(Location((-1330, -160.62221145, 0), (0, 0, 270))):
            Circle(SKETCH43_R)
    extrude(amount=CUT_EXTRUDE16_DEPTH + CUT_EXTRUDE16_DEPTH_BACK, mode=Mode.SUBTRACT)


solid = Compound([part.part, body_3_2.part, body_4.part, body_5.part, body_8.part, body_2_2.part])
